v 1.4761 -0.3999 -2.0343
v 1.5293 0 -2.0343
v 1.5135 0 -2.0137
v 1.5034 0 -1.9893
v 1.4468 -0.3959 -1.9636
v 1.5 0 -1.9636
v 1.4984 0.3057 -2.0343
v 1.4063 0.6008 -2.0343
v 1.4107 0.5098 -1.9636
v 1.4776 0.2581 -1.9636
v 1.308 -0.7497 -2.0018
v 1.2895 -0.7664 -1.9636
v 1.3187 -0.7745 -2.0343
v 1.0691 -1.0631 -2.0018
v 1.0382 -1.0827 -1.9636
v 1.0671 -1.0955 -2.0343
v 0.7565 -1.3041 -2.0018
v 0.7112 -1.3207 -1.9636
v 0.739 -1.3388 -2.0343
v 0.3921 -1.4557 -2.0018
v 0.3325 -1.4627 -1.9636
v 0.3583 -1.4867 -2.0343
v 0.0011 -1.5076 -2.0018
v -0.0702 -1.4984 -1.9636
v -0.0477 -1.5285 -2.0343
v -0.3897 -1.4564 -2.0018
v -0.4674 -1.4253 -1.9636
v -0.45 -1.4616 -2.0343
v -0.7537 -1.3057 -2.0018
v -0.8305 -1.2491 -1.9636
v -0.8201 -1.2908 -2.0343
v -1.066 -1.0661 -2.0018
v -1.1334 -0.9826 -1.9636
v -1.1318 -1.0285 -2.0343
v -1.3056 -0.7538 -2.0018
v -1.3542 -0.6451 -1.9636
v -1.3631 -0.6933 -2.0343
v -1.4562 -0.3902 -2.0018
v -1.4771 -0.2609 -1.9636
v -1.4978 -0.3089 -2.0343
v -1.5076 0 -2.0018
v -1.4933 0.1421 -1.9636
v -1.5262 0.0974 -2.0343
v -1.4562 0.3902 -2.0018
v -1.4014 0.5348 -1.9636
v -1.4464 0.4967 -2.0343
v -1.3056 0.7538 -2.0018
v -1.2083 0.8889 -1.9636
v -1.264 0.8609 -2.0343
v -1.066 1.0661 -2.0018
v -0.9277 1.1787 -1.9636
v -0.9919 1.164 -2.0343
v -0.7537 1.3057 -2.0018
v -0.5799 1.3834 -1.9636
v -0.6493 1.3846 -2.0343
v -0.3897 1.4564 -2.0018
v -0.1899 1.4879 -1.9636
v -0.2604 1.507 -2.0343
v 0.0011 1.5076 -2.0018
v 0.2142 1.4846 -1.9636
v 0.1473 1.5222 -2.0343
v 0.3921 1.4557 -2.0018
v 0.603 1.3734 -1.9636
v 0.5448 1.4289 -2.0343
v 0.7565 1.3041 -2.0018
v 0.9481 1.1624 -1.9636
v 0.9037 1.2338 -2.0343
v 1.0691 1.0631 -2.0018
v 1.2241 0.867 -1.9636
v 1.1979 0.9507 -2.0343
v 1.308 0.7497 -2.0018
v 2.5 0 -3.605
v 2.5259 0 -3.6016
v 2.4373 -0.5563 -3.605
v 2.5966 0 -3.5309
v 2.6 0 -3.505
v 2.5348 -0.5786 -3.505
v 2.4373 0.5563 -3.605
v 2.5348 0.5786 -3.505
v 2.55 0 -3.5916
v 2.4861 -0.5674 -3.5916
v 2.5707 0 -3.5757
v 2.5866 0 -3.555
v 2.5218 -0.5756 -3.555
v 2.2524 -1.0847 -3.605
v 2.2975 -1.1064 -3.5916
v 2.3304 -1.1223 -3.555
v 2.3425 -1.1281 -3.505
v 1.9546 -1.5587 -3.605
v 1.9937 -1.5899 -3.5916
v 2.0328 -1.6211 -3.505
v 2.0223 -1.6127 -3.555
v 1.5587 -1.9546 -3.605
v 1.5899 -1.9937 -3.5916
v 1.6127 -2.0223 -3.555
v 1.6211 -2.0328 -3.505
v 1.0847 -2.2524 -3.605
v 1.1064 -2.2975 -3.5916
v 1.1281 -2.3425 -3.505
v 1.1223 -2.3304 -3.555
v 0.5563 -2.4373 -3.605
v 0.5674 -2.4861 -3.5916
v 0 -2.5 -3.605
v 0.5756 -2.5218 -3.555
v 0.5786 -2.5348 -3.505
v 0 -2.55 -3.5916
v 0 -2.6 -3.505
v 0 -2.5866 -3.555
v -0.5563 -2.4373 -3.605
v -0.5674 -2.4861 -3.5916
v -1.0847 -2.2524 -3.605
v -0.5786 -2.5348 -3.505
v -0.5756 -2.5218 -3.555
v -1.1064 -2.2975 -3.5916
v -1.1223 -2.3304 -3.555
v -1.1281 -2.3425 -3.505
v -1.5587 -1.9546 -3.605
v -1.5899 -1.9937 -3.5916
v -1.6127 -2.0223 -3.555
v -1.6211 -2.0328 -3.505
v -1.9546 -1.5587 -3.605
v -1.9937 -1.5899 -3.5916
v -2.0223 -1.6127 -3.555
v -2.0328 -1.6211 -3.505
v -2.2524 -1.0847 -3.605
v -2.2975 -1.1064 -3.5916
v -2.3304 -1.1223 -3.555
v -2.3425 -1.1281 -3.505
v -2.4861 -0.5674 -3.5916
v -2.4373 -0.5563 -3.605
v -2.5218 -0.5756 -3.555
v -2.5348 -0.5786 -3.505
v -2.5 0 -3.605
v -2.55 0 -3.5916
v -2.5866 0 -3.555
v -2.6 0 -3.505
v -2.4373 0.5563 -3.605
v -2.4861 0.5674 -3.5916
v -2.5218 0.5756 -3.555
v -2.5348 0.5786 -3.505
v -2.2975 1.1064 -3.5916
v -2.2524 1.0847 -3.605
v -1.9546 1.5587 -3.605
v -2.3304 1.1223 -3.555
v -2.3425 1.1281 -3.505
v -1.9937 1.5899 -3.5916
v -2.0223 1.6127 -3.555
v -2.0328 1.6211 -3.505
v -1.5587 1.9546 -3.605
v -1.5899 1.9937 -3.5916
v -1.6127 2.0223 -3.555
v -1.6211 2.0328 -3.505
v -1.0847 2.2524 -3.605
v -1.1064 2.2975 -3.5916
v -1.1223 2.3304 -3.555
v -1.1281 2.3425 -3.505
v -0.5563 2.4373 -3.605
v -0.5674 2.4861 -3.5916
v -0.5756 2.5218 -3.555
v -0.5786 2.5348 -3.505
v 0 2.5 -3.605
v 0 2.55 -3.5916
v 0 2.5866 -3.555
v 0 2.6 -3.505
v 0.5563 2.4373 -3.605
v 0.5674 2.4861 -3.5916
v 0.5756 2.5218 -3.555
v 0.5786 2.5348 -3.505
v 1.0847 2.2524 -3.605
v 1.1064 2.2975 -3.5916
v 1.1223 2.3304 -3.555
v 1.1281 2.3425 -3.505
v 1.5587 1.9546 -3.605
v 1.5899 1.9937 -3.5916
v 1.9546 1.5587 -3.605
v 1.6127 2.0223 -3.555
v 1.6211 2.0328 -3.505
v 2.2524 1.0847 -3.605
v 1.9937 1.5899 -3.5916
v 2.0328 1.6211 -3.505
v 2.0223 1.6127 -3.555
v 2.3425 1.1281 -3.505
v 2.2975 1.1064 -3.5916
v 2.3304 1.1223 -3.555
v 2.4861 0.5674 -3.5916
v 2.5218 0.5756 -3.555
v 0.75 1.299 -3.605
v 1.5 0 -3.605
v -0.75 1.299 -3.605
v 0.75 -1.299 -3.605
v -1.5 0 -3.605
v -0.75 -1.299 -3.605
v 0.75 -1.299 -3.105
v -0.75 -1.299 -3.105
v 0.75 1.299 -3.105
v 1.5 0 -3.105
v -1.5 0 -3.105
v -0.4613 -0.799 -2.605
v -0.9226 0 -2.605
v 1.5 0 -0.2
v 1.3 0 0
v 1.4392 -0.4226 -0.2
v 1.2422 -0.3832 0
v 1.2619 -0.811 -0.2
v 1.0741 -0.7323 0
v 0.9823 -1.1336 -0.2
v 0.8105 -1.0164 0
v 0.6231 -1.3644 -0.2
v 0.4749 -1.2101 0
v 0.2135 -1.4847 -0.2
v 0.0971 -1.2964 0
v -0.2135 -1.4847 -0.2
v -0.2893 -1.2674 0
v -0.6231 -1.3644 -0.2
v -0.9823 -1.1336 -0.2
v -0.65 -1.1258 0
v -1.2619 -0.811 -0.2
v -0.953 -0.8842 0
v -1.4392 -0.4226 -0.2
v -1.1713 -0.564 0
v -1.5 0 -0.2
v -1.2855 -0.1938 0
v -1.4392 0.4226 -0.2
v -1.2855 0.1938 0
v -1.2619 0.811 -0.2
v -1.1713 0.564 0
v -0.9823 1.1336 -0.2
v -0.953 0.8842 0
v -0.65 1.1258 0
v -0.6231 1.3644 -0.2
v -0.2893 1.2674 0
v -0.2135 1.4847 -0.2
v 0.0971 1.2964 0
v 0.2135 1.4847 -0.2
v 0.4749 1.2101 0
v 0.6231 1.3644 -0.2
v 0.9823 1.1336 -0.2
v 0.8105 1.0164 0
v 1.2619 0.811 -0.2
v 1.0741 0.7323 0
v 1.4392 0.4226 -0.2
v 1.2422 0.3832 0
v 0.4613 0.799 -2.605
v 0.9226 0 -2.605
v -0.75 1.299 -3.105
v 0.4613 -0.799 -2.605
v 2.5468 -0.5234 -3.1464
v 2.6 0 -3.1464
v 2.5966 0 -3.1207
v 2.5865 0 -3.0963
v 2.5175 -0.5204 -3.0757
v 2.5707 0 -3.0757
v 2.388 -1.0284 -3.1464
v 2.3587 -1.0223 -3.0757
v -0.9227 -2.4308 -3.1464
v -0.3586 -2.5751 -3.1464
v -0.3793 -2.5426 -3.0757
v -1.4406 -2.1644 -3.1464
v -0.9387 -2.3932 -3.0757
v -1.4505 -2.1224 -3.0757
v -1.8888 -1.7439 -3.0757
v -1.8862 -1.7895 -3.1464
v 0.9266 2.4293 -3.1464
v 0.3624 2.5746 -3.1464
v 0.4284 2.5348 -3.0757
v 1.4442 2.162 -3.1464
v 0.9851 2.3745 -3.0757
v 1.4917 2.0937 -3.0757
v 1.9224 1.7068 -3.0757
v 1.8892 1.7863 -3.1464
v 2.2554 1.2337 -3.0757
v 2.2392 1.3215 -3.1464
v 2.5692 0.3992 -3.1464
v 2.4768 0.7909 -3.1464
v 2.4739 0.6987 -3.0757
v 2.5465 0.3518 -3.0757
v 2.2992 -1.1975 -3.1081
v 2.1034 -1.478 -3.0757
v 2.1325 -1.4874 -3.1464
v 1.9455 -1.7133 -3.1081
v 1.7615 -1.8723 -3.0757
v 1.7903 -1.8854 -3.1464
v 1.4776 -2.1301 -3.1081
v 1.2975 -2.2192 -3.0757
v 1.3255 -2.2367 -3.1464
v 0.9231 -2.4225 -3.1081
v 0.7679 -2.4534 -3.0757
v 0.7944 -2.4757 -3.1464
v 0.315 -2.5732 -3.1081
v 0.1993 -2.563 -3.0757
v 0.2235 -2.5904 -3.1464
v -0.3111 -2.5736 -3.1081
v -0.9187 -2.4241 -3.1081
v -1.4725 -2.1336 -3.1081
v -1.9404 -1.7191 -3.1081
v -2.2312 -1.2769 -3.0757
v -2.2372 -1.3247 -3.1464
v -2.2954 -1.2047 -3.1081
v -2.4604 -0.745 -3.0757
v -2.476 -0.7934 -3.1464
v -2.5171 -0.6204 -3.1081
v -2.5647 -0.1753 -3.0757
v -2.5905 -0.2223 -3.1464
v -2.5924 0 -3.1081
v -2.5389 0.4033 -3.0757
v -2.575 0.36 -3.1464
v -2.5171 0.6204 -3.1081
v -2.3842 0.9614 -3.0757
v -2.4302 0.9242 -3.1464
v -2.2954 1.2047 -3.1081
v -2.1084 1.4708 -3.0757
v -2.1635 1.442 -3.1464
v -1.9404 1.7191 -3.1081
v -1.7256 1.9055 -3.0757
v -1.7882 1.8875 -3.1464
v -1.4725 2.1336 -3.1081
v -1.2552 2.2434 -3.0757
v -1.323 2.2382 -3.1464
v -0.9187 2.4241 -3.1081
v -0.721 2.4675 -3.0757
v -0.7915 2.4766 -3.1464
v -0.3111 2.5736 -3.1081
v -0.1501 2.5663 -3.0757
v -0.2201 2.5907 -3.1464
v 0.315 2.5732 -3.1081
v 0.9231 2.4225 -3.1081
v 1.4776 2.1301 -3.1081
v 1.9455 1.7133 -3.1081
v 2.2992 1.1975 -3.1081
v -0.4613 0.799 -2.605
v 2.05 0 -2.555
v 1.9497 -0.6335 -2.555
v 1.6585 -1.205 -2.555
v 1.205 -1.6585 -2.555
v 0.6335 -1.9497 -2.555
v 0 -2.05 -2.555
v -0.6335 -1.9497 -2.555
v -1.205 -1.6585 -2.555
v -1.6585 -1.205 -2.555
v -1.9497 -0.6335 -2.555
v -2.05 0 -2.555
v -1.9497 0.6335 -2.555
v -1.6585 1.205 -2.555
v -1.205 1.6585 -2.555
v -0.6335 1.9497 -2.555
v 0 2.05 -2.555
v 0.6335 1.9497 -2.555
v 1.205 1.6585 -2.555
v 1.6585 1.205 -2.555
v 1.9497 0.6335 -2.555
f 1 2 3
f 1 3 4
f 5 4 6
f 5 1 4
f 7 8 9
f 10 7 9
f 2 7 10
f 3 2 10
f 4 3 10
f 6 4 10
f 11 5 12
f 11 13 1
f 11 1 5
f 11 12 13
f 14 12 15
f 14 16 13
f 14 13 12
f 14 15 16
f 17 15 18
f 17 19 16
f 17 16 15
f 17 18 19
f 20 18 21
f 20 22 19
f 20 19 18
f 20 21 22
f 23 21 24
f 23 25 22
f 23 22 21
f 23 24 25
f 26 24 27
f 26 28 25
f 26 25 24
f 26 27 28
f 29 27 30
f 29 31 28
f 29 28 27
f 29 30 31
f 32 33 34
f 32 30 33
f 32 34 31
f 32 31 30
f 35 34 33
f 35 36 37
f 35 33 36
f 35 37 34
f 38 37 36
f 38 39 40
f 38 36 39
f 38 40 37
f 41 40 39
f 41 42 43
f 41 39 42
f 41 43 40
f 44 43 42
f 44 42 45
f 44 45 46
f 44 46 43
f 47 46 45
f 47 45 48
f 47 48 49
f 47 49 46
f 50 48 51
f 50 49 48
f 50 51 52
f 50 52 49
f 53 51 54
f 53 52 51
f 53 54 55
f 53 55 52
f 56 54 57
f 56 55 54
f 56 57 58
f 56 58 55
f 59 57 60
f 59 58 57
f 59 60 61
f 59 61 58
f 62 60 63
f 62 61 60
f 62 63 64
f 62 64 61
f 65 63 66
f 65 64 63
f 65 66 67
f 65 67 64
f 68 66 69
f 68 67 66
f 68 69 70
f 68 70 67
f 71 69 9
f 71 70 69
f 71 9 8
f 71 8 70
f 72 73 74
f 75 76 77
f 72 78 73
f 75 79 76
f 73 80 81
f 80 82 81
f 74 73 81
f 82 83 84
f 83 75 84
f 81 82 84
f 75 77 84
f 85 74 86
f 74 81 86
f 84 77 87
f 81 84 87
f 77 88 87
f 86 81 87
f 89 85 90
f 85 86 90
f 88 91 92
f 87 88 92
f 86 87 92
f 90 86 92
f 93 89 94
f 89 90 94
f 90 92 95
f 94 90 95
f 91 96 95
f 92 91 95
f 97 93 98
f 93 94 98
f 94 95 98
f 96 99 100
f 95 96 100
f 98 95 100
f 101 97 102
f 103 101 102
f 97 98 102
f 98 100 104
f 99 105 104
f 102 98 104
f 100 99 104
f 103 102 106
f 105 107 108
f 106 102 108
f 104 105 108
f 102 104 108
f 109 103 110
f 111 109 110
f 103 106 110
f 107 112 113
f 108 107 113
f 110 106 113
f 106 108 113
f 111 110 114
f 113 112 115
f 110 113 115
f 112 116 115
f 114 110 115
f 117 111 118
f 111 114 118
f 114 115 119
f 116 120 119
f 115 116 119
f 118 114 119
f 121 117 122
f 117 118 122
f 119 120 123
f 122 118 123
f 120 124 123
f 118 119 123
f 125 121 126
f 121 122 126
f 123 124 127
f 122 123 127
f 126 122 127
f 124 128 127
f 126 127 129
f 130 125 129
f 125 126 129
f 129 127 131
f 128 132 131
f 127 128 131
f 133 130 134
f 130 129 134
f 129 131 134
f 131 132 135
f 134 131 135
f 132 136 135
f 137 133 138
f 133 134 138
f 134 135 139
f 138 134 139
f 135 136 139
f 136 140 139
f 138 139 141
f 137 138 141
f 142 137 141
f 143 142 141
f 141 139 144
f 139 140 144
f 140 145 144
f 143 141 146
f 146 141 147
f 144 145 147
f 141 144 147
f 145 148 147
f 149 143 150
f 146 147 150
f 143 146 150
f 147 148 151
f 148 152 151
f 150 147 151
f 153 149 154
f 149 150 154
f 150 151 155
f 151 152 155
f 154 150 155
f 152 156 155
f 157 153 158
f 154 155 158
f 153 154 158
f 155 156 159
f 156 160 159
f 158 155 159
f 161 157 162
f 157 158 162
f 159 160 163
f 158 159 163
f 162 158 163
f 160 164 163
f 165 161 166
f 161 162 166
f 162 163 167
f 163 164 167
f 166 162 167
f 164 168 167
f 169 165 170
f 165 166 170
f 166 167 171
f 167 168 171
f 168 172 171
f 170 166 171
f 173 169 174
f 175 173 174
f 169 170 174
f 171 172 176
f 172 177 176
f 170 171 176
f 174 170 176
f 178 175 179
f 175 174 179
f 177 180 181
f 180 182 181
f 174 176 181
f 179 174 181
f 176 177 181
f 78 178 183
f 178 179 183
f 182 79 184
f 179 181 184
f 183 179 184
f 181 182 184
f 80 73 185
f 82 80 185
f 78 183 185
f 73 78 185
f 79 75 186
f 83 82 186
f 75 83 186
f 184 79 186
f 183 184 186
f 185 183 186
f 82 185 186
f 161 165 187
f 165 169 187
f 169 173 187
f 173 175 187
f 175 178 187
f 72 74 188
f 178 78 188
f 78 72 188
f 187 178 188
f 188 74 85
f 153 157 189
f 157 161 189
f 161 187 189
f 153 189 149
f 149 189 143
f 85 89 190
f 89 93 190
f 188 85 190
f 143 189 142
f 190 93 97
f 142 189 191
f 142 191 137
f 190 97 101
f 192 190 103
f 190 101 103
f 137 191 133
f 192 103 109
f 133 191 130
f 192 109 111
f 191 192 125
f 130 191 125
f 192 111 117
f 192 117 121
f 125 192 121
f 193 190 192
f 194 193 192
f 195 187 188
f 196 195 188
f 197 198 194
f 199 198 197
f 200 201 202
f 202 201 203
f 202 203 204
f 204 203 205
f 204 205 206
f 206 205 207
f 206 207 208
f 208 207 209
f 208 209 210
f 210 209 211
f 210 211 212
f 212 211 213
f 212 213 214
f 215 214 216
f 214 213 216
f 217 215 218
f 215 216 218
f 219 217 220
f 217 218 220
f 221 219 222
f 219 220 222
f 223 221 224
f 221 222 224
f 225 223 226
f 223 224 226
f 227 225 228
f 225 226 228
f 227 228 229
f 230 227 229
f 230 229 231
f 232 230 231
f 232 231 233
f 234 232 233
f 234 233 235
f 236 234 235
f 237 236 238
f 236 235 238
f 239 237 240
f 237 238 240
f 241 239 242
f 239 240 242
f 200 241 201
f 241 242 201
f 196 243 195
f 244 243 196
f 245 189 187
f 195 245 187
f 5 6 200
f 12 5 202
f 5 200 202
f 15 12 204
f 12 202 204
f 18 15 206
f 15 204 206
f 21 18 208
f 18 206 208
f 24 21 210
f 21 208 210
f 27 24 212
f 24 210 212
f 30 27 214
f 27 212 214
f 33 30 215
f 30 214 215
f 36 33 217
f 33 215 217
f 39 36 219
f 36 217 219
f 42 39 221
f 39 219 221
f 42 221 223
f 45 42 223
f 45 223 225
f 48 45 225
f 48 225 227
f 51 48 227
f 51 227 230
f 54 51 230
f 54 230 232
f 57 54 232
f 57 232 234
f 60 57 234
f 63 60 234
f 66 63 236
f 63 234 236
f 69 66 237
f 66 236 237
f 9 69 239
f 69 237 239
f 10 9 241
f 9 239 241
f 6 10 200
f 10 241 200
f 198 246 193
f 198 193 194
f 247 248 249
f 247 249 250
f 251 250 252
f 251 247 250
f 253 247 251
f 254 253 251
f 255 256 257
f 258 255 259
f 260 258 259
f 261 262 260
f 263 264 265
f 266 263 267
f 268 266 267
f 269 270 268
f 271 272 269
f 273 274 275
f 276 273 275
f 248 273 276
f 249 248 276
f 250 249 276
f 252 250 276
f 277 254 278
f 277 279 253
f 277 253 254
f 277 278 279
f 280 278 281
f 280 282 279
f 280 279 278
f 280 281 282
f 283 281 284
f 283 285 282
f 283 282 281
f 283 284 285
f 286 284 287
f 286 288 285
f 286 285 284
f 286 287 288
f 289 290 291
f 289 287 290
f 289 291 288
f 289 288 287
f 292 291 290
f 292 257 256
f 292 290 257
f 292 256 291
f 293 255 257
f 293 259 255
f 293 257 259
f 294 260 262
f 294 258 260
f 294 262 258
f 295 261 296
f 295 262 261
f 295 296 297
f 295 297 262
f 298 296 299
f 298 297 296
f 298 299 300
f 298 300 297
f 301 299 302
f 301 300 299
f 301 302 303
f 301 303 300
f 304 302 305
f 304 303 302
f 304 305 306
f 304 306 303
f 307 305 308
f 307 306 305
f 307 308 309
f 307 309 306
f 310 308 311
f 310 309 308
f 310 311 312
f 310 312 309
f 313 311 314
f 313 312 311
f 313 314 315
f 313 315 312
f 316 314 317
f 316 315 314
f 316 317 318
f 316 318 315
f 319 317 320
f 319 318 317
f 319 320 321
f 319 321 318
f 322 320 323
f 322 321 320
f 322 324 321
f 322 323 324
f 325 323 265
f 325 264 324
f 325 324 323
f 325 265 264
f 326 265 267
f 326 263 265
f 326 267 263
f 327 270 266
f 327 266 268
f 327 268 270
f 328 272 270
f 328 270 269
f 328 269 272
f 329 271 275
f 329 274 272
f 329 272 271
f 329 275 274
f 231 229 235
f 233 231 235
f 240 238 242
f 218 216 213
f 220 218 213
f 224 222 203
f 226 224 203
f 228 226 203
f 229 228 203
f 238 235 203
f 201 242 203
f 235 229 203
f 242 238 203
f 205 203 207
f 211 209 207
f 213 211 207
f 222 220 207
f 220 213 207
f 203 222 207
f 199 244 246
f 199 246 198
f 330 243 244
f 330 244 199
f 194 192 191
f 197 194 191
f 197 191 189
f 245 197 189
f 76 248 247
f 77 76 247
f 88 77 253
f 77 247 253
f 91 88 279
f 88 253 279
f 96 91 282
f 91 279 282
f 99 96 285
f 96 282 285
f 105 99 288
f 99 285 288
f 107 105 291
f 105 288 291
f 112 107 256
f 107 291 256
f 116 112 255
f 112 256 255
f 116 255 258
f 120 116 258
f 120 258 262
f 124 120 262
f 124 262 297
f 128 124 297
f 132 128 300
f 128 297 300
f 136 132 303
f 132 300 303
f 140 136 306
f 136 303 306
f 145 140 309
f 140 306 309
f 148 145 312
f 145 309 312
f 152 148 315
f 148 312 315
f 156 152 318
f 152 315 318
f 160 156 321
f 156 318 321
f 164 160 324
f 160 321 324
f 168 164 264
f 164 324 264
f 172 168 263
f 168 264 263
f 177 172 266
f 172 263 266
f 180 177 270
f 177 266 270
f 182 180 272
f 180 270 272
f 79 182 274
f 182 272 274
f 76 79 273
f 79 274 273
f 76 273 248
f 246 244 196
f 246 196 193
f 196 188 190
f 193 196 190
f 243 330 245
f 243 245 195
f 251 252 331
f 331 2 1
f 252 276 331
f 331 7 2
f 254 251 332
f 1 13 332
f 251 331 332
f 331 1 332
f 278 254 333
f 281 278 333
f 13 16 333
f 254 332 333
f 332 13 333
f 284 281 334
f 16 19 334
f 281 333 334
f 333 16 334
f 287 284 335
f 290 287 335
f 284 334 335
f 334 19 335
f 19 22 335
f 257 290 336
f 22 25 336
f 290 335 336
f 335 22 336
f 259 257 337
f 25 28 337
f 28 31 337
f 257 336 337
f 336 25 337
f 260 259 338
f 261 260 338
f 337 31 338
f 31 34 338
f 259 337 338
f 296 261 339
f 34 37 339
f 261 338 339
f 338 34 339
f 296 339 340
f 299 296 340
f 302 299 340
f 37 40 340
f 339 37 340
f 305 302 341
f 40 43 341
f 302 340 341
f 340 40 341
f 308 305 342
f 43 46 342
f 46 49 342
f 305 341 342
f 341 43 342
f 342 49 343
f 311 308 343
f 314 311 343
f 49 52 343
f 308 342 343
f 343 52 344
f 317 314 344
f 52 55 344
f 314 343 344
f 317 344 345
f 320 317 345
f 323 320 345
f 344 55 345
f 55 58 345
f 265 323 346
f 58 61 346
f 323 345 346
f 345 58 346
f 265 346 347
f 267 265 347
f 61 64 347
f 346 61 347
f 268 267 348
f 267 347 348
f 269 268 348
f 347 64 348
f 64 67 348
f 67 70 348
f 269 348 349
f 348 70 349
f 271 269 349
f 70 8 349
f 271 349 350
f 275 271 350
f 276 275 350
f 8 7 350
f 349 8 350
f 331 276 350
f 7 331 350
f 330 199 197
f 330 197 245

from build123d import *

# Parameters (mm, degrees)
CUT_EXTRUDE1_DEPTH = 1
CHAMFER1_SIZE      = 0.5
FILLET1_R          = 0.1
CHAMFER2_SIZE      = 0.2


with BuildPart() as part:
    # Sketch1 → Revolve1 (revolve)
    with BuildSketch(Plane(origin=(0, 0, 0), x_dir=(1, 0, 0), z_dir=(0, 1, 0))):
        Polygon((0, 3.604974233), (2.6, 3.604974233), (2.6, 3.104974233), (1.5, 2.004974233), (1.5, 0), (0, 0), align=None)
    revolve(axis=Axis((0, 0, 0), (0, 0, -1)))

    # Sketch2 → Cut-Extrude1 (cut)
    with BuildSketch(Plane(origin=(0, 0, -3.604974233), x_dir=(-1, 0, 0), z_dir=(0, 0, -1))):
        Polygon((1.5, 0), (0.75, 1.299038106), (-0.75, 1.299038106), (-1.5, 0), (-0.75, -1.299038106), (0.75, -1.299038106), align=None)
    extrude(amount=-CUT_EXTRUDE1_DEPTH, mode=Mode.SUBTRACT)

    # Chamfer1
    chamfer1_edges = [part.edges().sort_by_distance(p)[0] for p in [
        (-1.125, -0.649519053, -2.604974233),
        (0, -1.299038106, -2.604974233),
        (1.125, -0.649519053, -2.604974233),
        (1.125, 0.649519053, -2.604974233),
        (0, 1.299038106, -2.604974233),
        (-1.125, 0.649519053, -2.604974233),
    ]]
    chamfer(chamfer1_edges, length=CHAMFER1_SIZE)

    # Fillet1
    fillet1_edges = [part.edges().sort_by_distance(p)[0] for p in [
        (-1.5, 0, -2.004974233),
        (-2.6, 0, -3.104974233),
        (-2.6, 0, -3.604974233),
    ]]
    fillet(fillet1_edges, radius=FILLET1_R)

    # Chamfer2
    chamfer2_edges = [part.edges().sort_by_distance(p)[0] for p in [
        (-1.5, 0, 0),
    ]]
    chamfer(chamfer2_edges, length=CHAMFER2_SIZE)


solid = part.part
